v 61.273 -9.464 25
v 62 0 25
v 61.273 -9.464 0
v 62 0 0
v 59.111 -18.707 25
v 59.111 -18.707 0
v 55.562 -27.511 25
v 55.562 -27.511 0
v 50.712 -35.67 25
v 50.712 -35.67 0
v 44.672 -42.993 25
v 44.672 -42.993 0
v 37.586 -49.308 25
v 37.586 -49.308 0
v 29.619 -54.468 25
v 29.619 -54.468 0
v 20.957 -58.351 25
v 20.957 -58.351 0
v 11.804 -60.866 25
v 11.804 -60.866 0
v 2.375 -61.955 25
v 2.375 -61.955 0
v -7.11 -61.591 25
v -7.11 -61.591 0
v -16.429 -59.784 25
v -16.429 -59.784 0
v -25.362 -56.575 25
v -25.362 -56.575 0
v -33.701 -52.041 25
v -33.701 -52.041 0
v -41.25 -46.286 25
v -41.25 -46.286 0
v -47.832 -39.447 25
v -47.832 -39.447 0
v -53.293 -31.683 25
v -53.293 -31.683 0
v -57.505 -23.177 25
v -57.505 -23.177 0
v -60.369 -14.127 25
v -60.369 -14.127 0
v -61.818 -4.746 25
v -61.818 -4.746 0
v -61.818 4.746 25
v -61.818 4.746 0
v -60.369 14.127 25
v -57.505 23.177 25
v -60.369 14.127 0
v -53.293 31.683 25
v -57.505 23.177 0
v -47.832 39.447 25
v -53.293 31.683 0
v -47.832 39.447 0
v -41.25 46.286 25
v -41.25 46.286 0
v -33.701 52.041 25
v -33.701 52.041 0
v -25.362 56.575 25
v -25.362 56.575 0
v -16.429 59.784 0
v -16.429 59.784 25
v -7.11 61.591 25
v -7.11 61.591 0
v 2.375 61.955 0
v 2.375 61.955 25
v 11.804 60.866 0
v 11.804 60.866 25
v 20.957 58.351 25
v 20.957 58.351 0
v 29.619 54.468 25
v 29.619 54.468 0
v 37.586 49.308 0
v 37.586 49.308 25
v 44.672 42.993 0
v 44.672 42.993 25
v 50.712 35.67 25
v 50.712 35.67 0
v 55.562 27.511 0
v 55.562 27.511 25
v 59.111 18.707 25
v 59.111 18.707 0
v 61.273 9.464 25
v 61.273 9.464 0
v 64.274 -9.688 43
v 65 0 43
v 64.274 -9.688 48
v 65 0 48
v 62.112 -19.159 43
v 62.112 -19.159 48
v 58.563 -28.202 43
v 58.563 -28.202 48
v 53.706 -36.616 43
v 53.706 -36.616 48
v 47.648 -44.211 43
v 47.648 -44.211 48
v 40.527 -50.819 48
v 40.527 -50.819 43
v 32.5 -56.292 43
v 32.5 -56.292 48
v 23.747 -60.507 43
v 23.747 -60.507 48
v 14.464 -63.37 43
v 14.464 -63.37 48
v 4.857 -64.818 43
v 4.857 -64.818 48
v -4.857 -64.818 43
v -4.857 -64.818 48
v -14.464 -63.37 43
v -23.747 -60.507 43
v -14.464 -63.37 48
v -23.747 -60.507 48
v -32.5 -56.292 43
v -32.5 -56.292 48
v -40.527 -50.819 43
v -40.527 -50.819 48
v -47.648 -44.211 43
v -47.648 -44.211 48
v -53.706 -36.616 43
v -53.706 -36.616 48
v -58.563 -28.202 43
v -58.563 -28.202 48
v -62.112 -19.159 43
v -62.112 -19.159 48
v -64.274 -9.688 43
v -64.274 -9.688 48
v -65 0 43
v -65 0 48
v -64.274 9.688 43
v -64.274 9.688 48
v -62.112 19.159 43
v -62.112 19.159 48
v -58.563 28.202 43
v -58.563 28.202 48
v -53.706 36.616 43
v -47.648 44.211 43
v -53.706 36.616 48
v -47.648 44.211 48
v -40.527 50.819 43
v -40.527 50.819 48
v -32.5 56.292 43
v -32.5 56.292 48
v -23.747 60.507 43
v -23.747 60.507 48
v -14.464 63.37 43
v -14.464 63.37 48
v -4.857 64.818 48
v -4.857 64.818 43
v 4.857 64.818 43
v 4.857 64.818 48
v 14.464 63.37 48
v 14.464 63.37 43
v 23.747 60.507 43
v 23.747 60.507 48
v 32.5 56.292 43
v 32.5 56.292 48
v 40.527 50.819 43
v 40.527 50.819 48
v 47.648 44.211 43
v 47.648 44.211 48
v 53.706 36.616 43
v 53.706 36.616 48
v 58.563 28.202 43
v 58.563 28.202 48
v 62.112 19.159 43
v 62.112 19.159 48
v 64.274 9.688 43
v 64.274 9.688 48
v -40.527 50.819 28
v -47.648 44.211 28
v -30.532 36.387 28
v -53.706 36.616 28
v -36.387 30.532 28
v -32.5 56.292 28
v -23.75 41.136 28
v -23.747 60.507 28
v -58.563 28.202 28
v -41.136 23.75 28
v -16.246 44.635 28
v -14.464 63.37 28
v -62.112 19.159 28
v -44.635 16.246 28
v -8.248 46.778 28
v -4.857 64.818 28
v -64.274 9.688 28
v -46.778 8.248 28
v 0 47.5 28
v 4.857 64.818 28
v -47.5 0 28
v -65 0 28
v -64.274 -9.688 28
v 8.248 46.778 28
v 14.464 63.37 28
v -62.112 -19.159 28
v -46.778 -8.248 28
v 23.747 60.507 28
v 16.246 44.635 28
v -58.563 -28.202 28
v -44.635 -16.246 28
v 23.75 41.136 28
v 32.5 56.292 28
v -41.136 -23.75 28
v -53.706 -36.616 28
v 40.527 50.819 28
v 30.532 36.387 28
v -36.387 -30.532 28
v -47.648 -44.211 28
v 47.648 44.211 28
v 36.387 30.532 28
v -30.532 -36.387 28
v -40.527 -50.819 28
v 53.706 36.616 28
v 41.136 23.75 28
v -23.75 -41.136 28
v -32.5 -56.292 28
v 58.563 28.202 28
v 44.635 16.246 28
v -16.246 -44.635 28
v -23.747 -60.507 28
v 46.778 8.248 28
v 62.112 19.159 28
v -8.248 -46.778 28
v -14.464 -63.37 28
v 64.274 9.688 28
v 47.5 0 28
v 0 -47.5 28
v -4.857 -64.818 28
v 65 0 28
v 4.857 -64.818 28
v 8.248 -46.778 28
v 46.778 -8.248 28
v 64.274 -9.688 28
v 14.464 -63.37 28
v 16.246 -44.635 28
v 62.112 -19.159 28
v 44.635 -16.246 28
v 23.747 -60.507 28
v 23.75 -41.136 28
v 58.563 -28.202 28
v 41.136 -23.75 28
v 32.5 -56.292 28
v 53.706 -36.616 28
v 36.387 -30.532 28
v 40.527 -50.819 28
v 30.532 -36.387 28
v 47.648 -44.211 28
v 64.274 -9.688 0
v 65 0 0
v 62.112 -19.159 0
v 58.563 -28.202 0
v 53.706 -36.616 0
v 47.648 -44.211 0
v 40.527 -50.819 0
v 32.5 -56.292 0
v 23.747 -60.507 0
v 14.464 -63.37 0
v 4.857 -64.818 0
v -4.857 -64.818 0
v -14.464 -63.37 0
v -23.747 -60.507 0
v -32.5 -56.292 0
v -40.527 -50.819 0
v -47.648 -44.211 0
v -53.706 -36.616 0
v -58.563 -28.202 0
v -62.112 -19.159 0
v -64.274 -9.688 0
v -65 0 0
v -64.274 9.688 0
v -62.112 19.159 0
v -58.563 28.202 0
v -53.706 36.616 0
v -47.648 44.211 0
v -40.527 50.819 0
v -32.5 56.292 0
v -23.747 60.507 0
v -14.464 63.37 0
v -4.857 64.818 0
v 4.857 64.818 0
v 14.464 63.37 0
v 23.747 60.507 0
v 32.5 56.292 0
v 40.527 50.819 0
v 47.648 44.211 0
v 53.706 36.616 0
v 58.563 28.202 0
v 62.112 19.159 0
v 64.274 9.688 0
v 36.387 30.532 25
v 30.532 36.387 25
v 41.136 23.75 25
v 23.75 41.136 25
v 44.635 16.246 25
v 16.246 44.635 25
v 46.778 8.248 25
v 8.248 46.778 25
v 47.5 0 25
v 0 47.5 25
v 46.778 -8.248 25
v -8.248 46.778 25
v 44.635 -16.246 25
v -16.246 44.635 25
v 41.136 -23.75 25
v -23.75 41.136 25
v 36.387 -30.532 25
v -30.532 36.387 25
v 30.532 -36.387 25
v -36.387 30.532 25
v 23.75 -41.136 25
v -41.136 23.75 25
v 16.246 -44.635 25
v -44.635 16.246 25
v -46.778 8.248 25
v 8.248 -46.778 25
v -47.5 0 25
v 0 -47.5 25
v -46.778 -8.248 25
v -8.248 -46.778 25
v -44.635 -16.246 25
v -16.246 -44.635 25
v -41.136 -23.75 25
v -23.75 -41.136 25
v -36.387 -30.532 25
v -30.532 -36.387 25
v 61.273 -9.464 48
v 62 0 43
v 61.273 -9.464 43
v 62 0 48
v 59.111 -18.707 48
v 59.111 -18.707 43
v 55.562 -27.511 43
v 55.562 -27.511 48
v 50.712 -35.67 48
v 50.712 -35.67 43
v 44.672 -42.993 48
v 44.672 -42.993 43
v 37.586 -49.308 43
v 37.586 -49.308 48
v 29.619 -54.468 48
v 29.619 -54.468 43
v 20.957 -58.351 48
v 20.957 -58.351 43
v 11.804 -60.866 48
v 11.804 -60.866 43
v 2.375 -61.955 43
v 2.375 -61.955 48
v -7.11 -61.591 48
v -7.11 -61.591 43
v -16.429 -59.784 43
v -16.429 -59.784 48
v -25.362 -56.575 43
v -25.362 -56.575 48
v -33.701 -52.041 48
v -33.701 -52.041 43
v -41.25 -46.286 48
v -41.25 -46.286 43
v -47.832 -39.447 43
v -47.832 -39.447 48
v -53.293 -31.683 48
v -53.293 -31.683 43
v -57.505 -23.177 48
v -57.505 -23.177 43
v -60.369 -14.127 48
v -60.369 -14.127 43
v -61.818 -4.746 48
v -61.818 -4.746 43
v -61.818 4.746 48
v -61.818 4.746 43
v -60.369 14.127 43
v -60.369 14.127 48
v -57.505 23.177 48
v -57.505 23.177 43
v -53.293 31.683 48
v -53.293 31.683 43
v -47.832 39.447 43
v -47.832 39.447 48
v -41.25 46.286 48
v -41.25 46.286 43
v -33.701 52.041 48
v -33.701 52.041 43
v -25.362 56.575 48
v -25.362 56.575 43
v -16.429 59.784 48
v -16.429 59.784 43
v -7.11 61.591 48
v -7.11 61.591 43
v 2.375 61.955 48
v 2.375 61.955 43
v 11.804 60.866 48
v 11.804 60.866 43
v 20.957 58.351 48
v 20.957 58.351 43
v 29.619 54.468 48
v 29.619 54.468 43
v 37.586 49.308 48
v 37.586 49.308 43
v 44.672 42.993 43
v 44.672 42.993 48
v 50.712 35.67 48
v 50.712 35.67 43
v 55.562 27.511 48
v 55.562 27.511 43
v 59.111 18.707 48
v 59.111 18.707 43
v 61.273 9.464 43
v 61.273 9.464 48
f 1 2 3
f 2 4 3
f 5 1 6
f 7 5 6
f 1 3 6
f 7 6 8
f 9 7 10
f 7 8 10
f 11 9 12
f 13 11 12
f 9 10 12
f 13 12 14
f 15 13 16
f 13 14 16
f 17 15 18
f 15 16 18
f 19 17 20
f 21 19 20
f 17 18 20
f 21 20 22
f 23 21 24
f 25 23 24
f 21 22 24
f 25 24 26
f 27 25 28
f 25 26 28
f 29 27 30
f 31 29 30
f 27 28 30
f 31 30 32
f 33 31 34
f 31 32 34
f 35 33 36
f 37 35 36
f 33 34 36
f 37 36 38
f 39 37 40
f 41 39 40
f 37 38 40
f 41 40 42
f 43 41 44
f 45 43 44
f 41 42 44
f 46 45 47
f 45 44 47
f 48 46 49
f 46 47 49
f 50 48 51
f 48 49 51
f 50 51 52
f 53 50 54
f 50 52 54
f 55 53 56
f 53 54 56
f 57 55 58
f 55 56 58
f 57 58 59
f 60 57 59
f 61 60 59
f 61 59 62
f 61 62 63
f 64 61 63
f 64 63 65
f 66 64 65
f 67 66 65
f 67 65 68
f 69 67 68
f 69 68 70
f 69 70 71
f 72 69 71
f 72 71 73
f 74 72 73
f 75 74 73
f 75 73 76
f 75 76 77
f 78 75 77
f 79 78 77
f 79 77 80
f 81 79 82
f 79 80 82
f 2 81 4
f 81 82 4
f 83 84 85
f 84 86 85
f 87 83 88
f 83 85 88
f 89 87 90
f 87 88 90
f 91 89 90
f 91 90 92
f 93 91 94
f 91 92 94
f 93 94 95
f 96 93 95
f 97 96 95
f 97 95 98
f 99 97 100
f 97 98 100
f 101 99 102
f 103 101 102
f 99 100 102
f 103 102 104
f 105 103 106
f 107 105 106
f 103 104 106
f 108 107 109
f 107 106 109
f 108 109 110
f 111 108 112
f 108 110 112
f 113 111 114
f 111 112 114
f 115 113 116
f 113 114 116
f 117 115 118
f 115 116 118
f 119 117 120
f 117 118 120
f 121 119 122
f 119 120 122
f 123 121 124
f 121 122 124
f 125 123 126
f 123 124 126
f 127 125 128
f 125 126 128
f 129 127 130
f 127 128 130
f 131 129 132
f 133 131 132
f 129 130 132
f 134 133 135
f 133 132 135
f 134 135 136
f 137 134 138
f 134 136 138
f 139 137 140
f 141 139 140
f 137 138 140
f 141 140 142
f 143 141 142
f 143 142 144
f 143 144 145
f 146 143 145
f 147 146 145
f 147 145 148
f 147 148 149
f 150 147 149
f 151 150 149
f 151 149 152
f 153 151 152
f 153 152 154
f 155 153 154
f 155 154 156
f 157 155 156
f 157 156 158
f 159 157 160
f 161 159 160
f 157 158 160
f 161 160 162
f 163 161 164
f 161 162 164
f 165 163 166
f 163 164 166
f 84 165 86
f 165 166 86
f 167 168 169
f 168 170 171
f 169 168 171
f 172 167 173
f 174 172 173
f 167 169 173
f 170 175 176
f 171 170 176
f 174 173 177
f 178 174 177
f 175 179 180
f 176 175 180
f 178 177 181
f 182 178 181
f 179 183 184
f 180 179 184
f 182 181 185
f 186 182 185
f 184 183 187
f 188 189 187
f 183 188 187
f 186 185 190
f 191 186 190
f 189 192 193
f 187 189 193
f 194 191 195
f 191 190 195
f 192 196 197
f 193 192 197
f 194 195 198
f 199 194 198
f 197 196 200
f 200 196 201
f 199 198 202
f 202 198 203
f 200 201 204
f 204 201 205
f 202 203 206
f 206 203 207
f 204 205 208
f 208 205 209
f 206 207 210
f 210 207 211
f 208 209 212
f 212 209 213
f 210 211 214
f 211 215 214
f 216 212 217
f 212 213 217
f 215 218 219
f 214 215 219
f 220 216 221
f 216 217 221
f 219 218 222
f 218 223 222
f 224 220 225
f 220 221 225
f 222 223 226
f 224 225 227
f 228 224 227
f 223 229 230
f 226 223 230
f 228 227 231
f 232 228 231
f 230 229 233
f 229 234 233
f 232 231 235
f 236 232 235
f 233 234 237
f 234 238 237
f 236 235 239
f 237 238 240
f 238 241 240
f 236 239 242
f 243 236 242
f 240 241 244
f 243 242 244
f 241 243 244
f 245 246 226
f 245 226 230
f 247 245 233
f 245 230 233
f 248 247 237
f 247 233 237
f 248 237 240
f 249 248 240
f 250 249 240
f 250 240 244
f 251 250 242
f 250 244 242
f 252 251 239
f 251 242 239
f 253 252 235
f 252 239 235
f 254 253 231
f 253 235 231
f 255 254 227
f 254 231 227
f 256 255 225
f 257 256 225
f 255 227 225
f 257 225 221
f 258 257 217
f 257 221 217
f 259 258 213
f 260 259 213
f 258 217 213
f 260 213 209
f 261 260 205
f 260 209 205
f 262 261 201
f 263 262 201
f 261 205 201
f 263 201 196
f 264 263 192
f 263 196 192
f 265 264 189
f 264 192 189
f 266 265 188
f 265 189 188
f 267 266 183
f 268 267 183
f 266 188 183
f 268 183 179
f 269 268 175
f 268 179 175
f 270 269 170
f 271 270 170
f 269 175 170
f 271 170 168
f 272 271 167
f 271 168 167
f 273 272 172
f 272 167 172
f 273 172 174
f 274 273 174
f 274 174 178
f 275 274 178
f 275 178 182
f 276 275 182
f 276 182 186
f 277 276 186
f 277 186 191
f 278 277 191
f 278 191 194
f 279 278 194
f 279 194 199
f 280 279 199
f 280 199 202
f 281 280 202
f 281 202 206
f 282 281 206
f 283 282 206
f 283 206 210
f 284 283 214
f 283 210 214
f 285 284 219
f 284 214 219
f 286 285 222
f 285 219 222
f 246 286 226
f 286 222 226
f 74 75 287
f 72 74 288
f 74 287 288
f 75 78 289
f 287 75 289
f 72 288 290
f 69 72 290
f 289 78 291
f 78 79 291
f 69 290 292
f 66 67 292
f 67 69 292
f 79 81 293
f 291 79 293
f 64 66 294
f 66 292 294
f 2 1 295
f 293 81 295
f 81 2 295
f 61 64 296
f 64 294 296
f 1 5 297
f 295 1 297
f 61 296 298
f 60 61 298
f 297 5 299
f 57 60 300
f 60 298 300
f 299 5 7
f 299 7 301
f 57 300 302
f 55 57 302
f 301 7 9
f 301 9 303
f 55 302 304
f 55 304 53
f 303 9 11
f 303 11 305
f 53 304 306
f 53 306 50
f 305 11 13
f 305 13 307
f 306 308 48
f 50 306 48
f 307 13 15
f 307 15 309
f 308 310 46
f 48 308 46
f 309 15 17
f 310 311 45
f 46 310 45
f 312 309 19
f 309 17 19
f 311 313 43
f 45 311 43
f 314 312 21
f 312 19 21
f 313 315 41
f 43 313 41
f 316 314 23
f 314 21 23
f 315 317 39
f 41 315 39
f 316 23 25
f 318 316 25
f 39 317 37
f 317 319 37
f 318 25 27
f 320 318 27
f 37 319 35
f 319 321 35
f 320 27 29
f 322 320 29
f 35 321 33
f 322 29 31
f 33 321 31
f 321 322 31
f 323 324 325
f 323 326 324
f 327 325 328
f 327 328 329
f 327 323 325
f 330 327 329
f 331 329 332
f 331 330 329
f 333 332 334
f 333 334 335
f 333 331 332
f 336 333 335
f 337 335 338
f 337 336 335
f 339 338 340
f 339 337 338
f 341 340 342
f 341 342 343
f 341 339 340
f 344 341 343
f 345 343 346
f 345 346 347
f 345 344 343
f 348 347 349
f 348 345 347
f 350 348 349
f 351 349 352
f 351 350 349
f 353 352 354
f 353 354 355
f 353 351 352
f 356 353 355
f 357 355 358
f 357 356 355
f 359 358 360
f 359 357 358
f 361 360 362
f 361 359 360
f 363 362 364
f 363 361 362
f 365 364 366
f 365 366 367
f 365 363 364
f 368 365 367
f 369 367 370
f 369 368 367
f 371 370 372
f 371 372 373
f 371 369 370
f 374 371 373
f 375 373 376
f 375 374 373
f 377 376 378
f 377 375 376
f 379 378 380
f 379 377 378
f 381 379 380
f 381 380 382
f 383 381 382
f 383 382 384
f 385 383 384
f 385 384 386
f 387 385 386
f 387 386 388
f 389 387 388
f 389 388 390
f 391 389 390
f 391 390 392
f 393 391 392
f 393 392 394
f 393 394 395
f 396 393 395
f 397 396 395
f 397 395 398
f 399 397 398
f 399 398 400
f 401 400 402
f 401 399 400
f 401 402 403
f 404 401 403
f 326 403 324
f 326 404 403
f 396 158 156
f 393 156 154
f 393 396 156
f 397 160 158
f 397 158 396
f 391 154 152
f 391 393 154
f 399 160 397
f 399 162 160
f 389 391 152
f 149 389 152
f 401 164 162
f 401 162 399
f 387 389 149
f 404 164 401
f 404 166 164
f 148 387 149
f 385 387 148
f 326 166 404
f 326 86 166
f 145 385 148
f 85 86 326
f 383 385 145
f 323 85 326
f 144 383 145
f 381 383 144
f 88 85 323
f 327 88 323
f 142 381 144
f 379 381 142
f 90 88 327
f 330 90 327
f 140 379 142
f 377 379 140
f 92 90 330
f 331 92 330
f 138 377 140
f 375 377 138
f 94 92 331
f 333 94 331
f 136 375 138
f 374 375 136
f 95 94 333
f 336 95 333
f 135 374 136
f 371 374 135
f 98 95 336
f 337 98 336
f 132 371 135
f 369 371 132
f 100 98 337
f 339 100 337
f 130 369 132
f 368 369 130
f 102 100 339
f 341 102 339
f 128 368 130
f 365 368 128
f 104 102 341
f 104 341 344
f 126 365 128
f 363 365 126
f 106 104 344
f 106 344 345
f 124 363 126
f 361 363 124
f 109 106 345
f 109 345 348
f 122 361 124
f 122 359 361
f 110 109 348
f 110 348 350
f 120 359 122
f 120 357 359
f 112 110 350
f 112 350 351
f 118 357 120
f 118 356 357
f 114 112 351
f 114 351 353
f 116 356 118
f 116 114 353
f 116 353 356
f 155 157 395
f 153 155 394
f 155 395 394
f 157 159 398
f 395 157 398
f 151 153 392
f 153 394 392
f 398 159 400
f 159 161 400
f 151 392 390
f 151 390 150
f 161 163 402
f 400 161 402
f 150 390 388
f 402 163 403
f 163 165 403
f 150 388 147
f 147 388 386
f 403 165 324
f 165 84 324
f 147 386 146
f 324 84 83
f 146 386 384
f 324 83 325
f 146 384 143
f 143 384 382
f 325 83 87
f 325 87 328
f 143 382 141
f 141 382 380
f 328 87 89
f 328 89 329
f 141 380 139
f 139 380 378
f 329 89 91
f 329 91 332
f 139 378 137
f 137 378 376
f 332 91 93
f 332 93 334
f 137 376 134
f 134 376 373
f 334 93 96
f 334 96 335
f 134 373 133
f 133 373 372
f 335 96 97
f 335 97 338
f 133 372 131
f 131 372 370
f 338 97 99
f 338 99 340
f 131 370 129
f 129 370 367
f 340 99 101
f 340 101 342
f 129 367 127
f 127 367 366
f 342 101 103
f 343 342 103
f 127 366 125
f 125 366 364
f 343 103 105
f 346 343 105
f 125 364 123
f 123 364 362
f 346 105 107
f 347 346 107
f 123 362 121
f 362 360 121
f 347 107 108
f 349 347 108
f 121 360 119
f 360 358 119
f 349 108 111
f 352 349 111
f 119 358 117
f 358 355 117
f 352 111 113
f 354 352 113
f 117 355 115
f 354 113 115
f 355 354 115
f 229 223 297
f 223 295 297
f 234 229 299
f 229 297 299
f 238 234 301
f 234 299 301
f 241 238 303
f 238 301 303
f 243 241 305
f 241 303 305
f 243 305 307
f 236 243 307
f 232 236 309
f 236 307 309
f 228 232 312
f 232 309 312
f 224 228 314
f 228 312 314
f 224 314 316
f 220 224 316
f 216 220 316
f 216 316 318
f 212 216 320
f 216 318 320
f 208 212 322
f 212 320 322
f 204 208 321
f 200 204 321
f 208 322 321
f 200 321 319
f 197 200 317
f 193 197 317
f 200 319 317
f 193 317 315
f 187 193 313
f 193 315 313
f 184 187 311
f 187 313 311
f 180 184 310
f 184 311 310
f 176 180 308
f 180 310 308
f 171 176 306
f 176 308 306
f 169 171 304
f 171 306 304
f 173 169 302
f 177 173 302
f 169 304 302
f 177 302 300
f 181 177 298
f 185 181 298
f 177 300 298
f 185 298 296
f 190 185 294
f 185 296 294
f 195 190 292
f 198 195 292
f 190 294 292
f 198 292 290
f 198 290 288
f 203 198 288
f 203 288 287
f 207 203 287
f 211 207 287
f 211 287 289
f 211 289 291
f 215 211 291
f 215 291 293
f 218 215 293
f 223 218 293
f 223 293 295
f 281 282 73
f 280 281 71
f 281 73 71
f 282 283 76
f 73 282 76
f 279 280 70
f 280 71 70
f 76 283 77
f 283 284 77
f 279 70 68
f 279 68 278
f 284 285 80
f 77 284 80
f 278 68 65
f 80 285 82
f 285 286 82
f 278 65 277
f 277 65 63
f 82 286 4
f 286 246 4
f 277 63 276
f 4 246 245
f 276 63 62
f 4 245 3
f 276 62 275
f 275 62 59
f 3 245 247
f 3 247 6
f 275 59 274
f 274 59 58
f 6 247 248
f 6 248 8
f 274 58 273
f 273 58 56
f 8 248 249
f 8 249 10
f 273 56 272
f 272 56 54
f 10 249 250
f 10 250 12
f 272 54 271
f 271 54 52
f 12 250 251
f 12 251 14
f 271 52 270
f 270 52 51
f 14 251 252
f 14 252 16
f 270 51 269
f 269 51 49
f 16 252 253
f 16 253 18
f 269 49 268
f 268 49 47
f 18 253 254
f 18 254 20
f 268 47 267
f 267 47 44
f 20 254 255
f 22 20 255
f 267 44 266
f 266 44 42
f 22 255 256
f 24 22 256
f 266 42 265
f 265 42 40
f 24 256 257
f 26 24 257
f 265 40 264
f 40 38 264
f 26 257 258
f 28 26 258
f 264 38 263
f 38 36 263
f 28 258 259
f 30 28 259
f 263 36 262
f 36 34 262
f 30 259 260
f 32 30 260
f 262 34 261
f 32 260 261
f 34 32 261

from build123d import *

# Parameters (mm, degrees)
F0_W = 3
F0_H = 5


with BuildPart() as f1:
    # F0 (on Front) → F1 (revolve)
    with BuildSketch(Plane.XZ):
        Polygon((65, 28), (47.5, 28), (47.5, 25), (62, 25), (62, 0), (65, 0), align=None)
        with Locations((63.5, 45.5)):
            Rectangle(F0_W, F0_H)
    revolve(axis=Axis((0, 0, 11.225136), (0, 0, -1)))


solid = f1.part
